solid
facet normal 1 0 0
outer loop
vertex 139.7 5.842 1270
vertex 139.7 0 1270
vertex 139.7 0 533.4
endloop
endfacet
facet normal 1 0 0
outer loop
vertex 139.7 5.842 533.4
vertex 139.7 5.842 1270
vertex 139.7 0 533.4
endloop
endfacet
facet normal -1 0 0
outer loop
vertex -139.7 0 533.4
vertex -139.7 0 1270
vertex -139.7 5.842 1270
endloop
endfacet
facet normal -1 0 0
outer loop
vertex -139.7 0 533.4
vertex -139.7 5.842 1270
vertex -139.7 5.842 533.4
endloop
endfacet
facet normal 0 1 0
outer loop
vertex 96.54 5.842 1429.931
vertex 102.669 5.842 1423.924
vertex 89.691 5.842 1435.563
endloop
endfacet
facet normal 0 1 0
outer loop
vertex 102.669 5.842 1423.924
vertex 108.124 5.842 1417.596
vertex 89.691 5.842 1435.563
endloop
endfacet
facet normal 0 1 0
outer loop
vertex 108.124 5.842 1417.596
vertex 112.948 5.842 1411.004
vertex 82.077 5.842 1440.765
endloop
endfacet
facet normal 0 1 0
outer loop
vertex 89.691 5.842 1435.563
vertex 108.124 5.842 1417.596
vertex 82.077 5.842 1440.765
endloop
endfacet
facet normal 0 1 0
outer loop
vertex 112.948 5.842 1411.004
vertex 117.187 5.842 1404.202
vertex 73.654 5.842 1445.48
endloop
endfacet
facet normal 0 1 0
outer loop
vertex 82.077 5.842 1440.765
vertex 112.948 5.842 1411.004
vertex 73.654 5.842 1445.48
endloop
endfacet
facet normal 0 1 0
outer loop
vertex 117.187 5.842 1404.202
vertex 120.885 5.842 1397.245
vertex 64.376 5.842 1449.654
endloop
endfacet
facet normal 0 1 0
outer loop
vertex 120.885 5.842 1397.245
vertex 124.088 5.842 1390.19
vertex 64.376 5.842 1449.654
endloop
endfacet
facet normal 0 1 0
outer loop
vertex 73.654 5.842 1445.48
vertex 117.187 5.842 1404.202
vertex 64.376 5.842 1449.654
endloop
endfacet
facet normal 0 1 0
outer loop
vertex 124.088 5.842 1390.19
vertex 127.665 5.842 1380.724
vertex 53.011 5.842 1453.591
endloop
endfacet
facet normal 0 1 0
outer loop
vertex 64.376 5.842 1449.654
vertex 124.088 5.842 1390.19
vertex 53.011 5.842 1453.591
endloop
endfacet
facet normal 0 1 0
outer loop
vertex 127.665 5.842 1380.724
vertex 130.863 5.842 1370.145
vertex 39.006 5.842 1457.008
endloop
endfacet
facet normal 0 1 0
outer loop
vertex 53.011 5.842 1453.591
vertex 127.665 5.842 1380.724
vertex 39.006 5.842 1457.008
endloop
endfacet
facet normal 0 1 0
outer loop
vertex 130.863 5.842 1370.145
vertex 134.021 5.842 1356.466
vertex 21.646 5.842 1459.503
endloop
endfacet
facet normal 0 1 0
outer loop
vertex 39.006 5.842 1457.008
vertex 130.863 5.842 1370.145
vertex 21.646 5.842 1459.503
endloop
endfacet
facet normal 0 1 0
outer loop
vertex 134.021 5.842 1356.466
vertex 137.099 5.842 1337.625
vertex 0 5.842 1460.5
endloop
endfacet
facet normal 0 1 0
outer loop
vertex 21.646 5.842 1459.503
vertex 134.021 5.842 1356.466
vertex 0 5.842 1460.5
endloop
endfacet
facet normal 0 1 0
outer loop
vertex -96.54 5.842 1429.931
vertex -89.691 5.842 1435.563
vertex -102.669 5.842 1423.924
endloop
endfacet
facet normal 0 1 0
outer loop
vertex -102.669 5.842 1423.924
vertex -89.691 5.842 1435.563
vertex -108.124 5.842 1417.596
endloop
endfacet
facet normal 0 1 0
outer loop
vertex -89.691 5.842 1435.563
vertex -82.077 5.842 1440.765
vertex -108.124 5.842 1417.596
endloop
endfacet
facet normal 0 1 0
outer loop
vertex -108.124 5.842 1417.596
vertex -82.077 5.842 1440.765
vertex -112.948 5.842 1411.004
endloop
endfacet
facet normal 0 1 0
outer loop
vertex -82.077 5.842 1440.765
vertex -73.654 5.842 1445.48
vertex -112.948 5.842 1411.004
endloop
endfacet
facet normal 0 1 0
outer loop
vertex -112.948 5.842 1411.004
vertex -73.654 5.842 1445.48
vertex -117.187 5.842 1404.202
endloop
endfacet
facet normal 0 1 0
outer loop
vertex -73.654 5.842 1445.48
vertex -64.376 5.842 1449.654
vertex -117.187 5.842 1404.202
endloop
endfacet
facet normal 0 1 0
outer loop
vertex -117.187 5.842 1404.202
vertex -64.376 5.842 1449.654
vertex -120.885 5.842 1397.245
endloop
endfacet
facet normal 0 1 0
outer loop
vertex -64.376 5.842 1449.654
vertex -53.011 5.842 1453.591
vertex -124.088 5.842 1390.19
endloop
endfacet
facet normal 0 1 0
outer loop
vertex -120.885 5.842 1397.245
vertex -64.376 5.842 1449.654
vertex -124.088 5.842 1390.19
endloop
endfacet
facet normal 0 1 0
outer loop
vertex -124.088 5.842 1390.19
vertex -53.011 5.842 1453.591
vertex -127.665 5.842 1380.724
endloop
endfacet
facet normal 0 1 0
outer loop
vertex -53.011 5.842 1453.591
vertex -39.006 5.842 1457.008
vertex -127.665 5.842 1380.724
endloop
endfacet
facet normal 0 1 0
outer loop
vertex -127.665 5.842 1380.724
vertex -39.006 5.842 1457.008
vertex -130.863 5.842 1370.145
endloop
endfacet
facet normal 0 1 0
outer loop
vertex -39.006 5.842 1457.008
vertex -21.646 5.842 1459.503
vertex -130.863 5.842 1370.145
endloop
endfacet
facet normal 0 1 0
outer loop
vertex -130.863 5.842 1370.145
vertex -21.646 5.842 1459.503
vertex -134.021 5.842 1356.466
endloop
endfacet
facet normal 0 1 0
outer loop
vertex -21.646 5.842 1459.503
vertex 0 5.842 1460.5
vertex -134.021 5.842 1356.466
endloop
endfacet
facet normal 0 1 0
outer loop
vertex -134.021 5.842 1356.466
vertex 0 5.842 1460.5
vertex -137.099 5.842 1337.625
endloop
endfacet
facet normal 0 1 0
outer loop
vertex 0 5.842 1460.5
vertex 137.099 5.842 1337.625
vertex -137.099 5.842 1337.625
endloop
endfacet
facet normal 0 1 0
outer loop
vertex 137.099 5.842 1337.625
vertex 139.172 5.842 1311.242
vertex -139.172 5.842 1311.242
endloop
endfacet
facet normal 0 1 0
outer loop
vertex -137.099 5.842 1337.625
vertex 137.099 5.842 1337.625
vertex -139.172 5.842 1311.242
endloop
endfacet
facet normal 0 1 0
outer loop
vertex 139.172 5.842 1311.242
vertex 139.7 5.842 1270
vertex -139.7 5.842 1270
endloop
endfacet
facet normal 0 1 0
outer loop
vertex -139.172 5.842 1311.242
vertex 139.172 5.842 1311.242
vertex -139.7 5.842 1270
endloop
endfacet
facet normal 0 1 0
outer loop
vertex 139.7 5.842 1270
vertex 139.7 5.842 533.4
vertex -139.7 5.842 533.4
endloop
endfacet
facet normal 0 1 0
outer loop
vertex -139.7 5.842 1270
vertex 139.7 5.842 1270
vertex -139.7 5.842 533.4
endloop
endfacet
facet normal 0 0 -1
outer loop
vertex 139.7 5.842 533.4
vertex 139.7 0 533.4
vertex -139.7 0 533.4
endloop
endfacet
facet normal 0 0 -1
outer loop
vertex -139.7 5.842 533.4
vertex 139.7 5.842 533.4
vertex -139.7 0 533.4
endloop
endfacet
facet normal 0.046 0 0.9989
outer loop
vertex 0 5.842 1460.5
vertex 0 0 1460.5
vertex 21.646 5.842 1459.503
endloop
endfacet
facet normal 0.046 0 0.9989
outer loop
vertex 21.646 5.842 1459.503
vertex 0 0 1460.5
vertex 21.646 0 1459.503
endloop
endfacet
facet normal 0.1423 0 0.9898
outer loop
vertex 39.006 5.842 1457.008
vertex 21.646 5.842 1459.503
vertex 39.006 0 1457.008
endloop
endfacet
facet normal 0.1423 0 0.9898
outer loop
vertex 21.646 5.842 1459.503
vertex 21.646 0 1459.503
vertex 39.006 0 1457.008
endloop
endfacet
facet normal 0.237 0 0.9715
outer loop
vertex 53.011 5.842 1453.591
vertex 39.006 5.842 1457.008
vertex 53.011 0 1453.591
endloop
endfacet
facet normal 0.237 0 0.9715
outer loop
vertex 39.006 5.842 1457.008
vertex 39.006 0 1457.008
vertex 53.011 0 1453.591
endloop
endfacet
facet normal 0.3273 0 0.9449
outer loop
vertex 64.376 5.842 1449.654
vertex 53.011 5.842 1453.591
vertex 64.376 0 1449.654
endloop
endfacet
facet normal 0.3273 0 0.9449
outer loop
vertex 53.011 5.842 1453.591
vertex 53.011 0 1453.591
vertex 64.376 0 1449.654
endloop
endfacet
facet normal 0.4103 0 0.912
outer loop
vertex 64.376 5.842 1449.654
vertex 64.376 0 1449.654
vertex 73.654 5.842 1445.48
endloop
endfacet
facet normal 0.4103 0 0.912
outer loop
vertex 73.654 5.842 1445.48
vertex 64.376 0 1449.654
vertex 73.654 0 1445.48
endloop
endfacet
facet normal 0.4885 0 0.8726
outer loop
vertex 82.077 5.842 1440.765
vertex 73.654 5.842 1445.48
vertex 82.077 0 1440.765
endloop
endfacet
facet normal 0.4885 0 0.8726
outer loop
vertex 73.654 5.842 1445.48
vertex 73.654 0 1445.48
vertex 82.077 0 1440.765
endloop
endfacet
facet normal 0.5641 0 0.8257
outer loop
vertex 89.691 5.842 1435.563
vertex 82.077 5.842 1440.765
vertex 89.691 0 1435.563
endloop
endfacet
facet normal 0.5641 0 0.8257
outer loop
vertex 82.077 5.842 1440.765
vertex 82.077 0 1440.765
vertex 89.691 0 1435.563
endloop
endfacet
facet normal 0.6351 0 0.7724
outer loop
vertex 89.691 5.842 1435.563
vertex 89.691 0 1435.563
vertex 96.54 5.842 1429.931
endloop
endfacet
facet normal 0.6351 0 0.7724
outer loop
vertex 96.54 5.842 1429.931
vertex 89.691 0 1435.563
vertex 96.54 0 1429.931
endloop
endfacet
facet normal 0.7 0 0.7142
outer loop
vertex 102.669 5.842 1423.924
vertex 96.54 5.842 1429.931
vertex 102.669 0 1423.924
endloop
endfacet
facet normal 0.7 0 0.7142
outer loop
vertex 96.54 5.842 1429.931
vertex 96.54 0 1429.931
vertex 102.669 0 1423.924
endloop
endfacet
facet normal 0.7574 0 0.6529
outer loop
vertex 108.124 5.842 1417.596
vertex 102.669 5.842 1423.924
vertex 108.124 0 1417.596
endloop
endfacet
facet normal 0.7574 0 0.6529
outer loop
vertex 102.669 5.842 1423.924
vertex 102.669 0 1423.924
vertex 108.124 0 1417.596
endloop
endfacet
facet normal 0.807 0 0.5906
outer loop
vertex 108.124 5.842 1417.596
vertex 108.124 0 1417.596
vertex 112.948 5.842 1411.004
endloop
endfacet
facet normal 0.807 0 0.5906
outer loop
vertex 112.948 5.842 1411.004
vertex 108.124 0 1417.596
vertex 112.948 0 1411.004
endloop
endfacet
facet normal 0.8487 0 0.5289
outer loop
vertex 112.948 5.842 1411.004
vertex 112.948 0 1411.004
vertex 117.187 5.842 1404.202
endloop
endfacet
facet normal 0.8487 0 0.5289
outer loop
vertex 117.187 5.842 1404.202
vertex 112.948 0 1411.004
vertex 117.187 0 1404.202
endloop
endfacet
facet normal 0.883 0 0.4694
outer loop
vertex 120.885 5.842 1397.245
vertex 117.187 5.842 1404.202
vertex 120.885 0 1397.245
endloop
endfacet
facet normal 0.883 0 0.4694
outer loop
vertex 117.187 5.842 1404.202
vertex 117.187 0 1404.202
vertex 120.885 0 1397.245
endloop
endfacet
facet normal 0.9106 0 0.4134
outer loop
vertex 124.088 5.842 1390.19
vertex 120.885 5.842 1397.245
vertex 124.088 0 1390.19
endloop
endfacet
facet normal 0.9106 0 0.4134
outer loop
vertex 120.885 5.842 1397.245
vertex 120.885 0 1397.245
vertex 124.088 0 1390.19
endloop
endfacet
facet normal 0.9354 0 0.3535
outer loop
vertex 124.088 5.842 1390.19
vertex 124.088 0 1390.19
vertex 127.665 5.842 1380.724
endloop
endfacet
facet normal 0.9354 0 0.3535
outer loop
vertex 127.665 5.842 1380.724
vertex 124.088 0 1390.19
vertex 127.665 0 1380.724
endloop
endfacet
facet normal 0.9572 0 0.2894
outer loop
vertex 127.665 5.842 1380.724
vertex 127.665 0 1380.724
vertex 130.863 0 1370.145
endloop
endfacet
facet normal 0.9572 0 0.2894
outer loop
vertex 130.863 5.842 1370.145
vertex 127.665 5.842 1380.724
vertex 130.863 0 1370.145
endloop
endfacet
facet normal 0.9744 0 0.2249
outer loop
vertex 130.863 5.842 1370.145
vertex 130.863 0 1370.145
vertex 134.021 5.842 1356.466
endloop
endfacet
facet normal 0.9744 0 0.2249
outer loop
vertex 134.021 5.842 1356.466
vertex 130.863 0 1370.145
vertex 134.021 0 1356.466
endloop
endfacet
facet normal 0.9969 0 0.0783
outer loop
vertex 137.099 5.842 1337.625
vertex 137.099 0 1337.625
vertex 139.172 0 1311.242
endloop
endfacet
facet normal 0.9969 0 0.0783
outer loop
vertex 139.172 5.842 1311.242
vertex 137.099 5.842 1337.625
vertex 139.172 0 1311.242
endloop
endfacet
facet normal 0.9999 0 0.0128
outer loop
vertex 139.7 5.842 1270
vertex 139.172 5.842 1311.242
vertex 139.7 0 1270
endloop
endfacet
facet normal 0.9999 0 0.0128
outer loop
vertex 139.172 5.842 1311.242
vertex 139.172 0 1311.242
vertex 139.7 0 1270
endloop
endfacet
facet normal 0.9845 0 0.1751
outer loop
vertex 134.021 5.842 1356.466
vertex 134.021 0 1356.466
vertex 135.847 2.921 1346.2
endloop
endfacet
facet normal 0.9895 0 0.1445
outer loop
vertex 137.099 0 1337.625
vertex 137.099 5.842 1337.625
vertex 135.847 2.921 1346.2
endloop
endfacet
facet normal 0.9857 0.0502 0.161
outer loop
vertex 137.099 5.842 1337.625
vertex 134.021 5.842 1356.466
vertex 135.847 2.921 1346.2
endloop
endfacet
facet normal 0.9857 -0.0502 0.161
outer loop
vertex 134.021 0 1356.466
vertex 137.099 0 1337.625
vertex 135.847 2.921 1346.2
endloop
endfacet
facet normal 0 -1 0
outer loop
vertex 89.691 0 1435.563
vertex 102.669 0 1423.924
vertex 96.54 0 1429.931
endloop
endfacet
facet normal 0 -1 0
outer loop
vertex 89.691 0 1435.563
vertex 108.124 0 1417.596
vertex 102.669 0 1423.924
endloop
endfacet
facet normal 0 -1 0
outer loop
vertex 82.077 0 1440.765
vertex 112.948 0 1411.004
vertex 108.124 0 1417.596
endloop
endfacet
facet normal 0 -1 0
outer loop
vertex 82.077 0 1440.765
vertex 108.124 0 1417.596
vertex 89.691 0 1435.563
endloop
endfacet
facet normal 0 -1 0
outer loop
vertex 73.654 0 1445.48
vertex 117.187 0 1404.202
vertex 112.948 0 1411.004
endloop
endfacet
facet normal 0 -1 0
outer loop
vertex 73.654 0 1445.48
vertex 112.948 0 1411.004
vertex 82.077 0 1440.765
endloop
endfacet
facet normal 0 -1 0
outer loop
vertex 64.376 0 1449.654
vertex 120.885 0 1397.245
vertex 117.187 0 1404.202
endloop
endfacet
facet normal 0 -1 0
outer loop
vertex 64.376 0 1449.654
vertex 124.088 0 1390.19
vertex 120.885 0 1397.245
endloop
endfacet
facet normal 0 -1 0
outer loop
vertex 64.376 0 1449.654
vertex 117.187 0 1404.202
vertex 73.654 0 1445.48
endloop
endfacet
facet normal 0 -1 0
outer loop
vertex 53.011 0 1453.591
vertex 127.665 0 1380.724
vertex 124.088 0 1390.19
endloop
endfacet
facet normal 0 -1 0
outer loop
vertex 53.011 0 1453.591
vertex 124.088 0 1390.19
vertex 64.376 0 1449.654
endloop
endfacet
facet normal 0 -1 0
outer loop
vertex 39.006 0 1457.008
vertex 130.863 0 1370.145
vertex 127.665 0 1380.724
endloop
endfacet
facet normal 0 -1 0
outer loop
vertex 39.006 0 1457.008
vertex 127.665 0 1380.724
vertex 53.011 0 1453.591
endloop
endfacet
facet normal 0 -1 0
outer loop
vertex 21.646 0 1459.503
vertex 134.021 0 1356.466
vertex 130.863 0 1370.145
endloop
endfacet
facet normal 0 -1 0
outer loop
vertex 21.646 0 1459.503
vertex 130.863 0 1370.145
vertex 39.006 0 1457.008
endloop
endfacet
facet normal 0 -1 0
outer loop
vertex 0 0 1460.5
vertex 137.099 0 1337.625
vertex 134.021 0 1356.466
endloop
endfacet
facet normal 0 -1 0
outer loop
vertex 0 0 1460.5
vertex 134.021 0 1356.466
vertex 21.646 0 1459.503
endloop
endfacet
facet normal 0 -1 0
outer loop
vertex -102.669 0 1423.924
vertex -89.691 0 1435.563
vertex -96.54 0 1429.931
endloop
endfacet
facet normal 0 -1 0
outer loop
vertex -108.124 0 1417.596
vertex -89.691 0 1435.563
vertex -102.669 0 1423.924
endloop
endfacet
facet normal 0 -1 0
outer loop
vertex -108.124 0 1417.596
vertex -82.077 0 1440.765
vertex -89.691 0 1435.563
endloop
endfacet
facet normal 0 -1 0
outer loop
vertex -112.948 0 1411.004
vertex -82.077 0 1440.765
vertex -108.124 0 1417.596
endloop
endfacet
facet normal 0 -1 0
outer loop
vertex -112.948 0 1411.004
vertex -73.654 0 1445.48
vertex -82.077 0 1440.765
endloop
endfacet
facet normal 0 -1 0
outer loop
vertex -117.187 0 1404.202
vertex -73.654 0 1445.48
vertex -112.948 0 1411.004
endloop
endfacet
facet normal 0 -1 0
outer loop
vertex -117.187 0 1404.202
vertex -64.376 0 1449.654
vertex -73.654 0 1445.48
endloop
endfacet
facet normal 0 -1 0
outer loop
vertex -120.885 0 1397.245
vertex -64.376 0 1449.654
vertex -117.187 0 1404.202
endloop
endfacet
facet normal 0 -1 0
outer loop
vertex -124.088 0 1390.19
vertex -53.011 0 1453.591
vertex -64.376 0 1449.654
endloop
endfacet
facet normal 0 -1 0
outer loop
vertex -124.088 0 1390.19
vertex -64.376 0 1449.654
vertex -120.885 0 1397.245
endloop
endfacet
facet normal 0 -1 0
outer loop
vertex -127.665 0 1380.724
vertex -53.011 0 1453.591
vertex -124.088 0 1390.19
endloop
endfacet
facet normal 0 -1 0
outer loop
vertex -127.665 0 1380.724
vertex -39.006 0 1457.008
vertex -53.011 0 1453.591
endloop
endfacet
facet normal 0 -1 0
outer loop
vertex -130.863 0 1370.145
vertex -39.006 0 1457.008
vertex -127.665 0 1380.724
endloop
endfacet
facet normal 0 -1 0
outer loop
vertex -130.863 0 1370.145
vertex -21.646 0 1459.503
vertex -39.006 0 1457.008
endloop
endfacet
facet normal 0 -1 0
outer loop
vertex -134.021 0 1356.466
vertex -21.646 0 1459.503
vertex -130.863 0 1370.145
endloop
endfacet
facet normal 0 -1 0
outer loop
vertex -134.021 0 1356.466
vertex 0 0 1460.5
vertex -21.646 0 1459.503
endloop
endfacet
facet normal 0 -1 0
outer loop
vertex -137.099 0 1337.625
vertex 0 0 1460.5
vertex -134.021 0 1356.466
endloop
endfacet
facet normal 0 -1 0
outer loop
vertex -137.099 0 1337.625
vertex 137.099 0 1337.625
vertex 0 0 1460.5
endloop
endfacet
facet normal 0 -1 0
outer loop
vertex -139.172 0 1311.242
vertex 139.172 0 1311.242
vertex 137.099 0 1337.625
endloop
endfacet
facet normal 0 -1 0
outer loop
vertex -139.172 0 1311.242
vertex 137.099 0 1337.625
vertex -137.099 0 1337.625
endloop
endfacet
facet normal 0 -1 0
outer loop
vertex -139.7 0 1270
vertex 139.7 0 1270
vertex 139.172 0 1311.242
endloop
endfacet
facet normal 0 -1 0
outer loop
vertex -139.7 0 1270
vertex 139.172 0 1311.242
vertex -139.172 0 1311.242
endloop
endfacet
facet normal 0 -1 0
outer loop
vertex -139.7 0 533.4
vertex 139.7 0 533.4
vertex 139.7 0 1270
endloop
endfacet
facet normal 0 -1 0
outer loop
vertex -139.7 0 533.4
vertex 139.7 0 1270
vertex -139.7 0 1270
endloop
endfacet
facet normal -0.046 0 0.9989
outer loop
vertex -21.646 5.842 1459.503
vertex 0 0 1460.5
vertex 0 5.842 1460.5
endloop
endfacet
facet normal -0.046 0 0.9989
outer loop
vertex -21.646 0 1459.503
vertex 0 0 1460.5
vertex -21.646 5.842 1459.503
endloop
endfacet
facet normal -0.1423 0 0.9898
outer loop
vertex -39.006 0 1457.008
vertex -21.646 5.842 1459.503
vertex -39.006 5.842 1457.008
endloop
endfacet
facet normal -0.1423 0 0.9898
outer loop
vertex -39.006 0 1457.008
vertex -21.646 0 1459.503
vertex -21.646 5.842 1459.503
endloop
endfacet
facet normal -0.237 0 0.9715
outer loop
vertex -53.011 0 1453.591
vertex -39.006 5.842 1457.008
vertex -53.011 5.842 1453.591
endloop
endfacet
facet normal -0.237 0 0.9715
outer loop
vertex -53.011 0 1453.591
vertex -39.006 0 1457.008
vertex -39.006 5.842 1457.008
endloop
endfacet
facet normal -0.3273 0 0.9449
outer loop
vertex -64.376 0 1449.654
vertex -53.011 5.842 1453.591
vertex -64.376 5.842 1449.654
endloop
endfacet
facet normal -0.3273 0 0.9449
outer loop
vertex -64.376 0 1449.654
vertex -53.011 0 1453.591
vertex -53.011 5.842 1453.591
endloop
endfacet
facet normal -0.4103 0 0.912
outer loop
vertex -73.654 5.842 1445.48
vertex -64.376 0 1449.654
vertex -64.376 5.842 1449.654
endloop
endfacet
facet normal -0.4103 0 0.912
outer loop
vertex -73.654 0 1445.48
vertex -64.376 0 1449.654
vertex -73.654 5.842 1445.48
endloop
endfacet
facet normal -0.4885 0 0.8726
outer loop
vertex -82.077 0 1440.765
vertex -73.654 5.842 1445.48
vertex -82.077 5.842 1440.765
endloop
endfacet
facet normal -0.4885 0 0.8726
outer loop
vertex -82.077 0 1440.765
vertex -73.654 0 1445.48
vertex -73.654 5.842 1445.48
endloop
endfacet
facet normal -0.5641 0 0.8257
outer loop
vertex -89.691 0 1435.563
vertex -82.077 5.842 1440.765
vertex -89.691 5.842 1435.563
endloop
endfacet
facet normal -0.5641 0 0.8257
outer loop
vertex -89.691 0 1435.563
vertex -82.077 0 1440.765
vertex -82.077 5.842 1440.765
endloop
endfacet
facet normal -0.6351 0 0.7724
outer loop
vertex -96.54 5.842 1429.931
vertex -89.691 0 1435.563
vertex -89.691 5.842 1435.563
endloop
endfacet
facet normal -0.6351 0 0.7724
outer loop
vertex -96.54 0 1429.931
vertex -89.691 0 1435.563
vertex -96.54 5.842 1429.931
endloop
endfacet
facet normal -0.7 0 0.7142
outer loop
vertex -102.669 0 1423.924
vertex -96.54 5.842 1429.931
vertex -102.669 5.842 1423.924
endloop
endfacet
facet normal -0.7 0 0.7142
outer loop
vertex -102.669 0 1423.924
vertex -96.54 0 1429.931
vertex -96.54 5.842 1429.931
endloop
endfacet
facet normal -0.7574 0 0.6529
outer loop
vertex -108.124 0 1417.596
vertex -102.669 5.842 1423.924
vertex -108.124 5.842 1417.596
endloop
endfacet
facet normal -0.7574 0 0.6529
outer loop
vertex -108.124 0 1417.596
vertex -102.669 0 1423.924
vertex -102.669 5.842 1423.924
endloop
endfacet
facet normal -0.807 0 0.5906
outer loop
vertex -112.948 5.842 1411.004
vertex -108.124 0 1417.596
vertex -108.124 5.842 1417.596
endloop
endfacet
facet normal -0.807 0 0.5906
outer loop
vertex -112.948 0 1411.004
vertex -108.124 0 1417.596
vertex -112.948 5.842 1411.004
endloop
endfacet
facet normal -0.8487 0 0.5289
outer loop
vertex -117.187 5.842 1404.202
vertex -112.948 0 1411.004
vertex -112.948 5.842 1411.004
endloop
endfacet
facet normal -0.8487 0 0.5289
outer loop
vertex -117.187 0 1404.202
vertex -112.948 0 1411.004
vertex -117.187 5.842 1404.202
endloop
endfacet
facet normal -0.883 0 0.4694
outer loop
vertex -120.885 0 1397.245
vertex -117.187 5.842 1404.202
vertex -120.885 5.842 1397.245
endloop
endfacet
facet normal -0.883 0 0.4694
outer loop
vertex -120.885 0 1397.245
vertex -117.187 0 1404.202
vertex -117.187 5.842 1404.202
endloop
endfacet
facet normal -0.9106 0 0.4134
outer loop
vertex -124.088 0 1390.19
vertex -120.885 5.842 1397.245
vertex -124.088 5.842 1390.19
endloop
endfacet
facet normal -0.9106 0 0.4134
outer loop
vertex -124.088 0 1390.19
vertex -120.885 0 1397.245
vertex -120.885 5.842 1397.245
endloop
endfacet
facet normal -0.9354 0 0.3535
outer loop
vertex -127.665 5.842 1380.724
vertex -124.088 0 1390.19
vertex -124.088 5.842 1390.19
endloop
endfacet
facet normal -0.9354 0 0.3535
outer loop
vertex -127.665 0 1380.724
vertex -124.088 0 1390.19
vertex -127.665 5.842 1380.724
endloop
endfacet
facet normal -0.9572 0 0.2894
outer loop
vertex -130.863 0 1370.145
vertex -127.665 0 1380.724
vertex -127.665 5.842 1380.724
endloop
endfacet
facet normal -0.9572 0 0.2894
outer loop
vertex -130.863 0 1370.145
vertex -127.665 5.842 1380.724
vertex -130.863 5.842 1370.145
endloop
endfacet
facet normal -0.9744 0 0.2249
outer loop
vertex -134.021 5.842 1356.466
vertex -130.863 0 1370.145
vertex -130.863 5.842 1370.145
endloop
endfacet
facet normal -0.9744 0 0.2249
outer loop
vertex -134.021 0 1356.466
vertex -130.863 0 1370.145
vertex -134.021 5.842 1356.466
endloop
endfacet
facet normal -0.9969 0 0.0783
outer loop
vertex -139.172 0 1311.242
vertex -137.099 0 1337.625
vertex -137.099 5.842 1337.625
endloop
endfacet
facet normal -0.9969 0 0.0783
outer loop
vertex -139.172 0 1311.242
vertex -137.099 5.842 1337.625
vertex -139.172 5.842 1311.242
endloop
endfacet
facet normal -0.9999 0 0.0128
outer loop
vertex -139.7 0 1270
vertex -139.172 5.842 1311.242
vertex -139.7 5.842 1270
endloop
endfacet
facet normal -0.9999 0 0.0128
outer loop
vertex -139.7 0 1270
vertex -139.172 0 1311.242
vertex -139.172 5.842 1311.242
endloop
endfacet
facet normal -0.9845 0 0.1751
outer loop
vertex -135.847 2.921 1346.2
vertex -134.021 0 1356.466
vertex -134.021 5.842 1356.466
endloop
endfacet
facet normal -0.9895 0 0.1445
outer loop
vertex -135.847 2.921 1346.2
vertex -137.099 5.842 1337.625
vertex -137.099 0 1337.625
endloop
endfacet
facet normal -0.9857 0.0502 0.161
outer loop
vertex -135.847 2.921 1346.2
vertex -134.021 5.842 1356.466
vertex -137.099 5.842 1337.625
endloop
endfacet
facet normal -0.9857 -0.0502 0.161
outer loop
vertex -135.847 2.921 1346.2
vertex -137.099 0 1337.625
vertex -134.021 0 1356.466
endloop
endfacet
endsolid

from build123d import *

# Parameters (mm, degrees)
BOSS_EXTRUDE1_DEPTH = 5.842
SKETCH4_W           = 139.7
SKETCH4_H           = 914.4
CUT_EXTRUDE1_DEPTH  = 1468.177722461


with BuildPart() as part:
    # Sketch3 → Boss-Extrude1 (new body)
    with BuildSketch(Plane(origin=(0, 0, 0), x_dir=(1, 0, 0), z_dir=(0, 1, 0))):
        with BuildLine():
            Line((0, 381), (0, -1460.5))
            add(Edge.make_bspline(
                [(0, -1460.5), (108.684994241, -1460.5), (137.201191705, -1361.385263755), (139.7, -1312.037784968), (139.7, -1270)],
                knots=[0, 0, 0, 0, 0.140310505, 0.200610012, 0.200610012, 0.200610012, 0.200610012], degree=3))
            Line((139.7, -1270), (139.7, 63.5))
            add(Edge.make_bspline(
                [(139.7, 63.5), (139.7, 105.409860509), (138.775867716, 206.495657368), (73.507849515, 381), (0, 381)],
                knots=[0.803817555, 0.803817555, 0.803817555, 0.803817555, 0.866735408, 1, 1, 1, 1], degree=3))
        make_face()
    extrude(amount=BOSS_EXTRUDE1_DEPTH)

    # Sketch4 → Cut-Extrude1 (cut, through all)
    with BuildSketch(Plane(origin=(0, 0, 0), x_dir=(1, 0, 0), z_dir=(0, 1, 0))):
        with Locations((69.85, -76.2)):
            Rectangle(SKETCH4_W, SKETCH4_H)
    extrude(amount=CUT_EXTRUDE1_DEPTH, mode=Mode.SUBTRACT)

    # Mirror1: part across plane


with BuildPart() as part_1:
    add(part.part)
    add(part.part.mirror(Plane(origin=(0, 0, 0), x_dir=(0, 0, 1), z_dir=(1, 0, 0))))


solid = part_1.part
